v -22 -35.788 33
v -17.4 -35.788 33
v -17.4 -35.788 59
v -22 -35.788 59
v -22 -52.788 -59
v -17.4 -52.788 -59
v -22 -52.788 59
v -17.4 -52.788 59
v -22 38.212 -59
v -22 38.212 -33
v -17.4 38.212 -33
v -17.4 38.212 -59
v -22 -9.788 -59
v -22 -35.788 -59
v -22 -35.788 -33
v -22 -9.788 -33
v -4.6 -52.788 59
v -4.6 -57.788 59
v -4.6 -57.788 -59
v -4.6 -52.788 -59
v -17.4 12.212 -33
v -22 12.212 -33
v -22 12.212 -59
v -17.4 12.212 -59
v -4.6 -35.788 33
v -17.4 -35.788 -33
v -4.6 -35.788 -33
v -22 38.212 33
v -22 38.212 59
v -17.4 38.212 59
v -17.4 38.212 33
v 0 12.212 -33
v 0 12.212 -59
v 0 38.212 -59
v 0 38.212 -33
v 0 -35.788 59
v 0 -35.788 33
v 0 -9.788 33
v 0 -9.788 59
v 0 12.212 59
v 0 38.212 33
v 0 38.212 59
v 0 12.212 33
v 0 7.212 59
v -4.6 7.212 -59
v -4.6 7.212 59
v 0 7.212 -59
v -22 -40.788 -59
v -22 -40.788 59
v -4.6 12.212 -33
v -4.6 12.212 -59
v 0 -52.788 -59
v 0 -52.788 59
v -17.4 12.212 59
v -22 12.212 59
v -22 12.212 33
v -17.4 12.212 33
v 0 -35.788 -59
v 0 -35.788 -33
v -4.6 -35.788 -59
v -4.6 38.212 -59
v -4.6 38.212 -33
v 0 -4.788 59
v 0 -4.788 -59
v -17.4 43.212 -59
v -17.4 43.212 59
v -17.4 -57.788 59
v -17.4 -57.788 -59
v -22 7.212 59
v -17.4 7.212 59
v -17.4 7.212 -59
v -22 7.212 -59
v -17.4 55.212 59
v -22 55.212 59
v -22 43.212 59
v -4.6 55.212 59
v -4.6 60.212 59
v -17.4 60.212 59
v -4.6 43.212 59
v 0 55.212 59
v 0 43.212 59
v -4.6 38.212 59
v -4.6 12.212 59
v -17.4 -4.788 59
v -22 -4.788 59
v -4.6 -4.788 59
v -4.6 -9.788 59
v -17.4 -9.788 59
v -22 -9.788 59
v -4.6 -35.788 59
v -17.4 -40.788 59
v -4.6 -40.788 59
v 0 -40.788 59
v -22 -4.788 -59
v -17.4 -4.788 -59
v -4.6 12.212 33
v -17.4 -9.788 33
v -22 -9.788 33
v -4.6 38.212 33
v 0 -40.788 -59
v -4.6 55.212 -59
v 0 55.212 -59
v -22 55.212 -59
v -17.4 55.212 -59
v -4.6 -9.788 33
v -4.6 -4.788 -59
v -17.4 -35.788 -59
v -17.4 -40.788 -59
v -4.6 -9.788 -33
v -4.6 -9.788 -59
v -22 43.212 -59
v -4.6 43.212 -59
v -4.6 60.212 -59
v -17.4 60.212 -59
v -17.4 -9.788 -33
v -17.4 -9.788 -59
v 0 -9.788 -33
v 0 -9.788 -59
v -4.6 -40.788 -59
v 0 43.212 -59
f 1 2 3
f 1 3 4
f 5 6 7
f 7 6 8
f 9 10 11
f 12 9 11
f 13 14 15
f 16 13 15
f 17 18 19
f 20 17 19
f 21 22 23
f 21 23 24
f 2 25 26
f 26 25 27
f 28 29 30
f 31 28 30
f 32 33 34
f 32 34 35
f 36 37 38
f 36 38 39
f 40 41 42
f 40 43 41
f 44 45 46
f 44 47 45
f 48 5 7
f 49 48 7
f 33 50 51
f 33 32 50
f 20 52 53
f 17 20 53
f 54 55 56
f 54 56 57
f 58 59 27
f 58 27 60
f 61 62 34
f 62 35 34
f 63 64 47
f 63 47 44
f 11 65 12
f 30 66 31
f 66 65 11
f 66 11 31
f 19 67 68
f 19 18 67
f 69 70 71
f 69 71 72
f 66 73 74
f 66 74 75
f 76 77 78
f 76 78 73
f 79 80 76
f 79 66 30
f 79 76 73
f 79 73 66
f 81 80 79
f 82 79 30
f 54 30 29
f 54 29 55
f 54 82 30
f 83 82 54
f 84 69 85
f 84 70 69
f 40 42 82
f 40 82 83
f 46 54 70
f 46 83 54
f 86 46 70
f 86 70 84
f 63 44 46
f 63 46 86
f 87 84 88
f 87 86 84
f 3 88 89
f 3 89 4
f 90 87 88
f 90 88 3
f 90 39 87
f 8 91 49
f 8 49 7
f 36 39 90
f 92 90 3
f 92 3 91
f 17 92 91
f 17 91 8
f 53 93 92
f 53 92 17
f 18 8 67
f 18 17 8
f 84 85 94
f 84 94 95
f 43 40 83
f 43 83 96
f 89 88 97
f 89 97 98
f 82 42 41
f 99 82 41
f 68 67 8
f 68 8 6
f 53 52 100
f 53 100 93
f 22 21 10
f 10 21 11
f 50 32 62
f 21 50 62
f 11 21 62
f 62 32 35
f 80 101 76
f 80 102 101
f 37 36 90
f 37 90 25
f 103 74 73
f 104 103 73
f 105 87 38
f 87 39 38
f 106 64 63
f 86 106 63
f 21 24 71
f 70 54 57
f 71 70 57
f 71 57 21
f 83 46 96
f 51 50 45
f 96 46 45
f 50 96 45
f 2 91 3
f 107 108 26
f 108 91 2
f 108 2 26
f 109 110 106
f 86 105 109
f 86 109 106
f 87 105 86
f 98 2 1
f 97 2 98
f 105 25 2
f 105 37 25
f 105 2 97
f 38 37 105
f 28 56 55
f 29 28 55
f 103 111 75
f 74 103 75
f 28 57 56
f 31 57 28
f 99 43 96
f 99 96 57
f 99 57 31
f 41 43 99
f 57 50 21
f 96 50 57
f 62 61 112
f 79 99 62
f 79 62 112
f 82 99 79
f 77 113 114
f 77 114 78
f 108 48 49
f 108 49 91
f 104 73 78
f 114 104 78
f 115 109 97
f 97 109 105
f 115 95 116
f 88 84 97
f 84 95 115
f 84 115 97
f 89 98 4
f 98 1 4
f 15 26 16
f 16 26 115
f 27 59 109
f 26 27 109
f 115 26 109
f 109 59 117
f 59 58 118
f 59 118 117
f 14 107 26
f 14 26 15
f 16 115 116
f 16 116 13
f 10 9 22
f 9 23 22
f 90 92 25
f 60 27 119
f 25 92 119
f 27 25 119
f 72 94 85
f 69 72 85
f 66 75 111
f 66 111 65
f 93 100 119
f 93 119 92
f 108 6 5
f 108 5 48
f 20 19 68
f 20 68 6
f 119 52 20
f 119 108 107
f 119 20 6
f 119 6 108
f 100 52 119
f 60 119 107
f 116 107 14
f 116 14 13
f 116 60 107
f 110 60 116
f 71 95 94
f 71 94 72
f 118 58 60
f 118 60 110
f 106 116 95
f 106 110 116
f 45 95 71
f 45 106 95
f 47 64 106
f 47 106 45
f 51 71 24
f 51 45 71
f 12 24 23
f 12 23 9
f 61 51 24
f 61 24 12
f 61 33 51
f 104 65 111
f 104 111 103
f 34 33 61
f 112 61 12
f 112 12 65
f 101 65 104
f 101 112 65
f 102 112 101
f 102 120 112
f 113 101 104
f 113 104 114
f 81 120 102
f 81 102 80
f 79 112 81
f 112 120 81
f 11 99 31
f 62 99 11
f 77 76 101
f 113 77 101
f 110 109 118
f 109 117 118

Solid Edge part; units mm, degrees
sketch "Sketch1" plane through (0, 0, 0) normal (1, 0, 0) x (0, 1, 0)
  line L0 (-57.7882, -59) -> (60.2118, -59)
  line L1 (60.2118, -59) -> (60.2118, 59)
  line L2 (60.2118, 59) -> (-57.7882, 59)
  line L3 (-57.7882, 59) -> (-57.7882, -59)
extrude "Protrusion1" add sketch "Sketch1" against normal blind 22
sketch "Sketch2" plane through (0, 1.2118, 0) normal (1, 0, 0) x (0, 1, 0)
  line L0 (-37, 33) -> (-37, -33)
  line L1 (-37, -33) -> (-11, -33)
  line L2 (-11, -33) -> (-11, 33)
  line L3 (-37, 33) -> (-11, 33)
extrude "ExtrudedCutout_1" cut sketch "Sketch2" against normal blind 50
sketch "Sketch3" plane through (0, 1.2118, 0) normal (1, 0, 0) x (0, 1, 0)
  line L0 (37, 33) -> (37, -33)
  line L1 (11, -33) -> (37, -33)
  line L2 (11, -33) -> (11, 33)
  line L3 (11, 33) -> (37, 33)
extrude "ExtrudedCutout_2" cut sketch "Sketch3" against normal blind 28
sketch "Sketch4" plane through (-11, -57.7882, 0) normal (0, -1, 0) x (0, 0, -1)
  line L0 (-59, 11) -> (59, 11)
  line L1 (-59, 11) -> (-59, 6.4)
  line L2 (-59, 6.4) -> (59, 6.4)
  line L3 (59, 6.4) -> (59, 11)
extrude "ExtrudedCutout_3" cut sketch "Sketch4" against normal blind 5
sketch "Sketch5" plane through (-13.3, -57.7882, 0) normal (0, -1, 0) x (0, 0, -1)
  line L0 (-59, -4.1) -> (59, -4.1)
  line L1 (59, -4.1) -> (59, -8.7)
  line L2 (59, -8.7) -> (-59, -8.7)
  line L3 (-59, -8.7) -> (-59, -4.1)
extrude "ExtrudedCutout_4" cut sketch "Sketch5" against normal blind 5
sketch "Sketch6" plane through (0, 3.7118, 0) normal (1, 0, 0) x (0, 1, 0)
  line L0 (-39.5, -37) -> (-39.5, -59)
  line L1 (-39.5, -59) -> (-44.5, -59)
  line L2 (-44.5, -59) -> (-44.5, 59)
  line L3 (-44.5, 59) -> (-39.5, 59)
  line L4 (-39.5, 59) -> (-39.5, -37)
extrude "ExtrudedCutout_5" cut sketch "Sketch6" against normal blind 4.6
sketch "Sketch7" plane through (-11, 1.2118, -59) normal (0, 0, -1) x (0, 1, 0)
  line L0 (-42, -11) -> (-42, -6.4)
  line L1 (-42, -6.4) -> (-37, -6.4)
  line L2 (-37, -6.4) -> (-37, -11)
  line L3 (-37, -11) -> (-42, -11)
extrude "ExtrudedCutout_6" cut sketch "Sketch7" against normal blind 120
sketch "Sketch8" plane through (0, 12.2118, 0) normal (1, 0, 0) x (0, 1, 0)
  line L0 (-22, -33) -> (-22, -59)
  line L1 (-22, -59) -> (-17, -59)
  line L2 (-17, -59) -> (-17, 59)
  line L3 (-17, 59) -> (-22, 59)
  line L4 (-22, 59) -> (-22, -33)
extrude "ExtrudedCutout_7" cut sketch "Sketch8" against normal blind 4.6
sketch "Sketch9" plane through (0, 27.7118, 0) normal (1, 0, 0) x (0, 1, 0)
  line L0 (-15.5, -33) -> (-15.5, -59)
  line L1 (-15.5, -59) -> (-20.5, -59)
  line L2 (-20.5, -59) -> (-20.5, 59)
  line L3 (-20.5, 59) -> (-15.5, 59)
  line L4 (-15.5, 59) -> (-15.5, -33)
extrude "ExtrudedCutout_8" cut sketch "Sketch9" against normal blind 4.6
sketch "Sketch10" plane through (-11, 1.2118, 59) normal (0, 0, 1) x (0, 1, 0)
  line L0 (-6, 11) -> (-6, 6.4)
  line L1 (-6, 6.4) -> (-11, 6.4)
  line L2 (-11, 6.4) -> (-11, 11)
  line L3 (-11, 11) -> (-6, 11)
  line L4 (11, 6.4) -> (6, 6.4)
  line L5 (6, 6.4) -> (6, 11)
  line L6 (6, 11) -> (11, 11)
  line L7 (11, 11) -> (11, 6.4)
extrude "Cutout1" cut sketch "Sketch10" against normal blind 118
sketch "Sketch11" plane through (0, 36.2118, 0) normal (1, 0, 0) x (0, 1, 0)
  line L0 (2, -59) -> (7, -59)
  line L1 (7, -59) -> (7, 59)
  line L2 (7, 59) -> (2, 59)
  line L3 (2, 59) -> (2, -59)
extrude "ExtrudedCutout_10" cut sketch "Sketch11" against normal blind 4.6
sketch "Sketch12" plane through (0, 51.7118, 0) normal (1, 0, 0) x (0, 0, -1)
  line L0 (59, 8.5) -> (59, 3.5)
  line L1 (59, 3.5) -> (-59, 3.5)
  line L2 (-59, 3.5) -> (-59, 8.5)
  line L3 (-59, 8.5) -> (59, 8.5)
extrude "ExtrudedCutout_11" cut sketch "Sketch12" against normal blind 4.6
sketch "Sketch13" plane through (-11, 1.2118, 59) normal (0, 0, 1) x (0, 1, 0)
  line L0 (42, 11) -> (42, 6.4)
  line L1 (42, 6.4) -> (37, 6.4)
  line L2 (37, 11) -> (37, 6.4)
  line L3 (42, 11) -> (37, 11)
  line L4 (54, 6.4) -> (59, 6.4)
  line L5 (59, 6.4) -> (59, 11)
  line L6 (59, 11) -> (54, 11)
  line L7 (54, 11) -> (54, 6.4)
extrude "ExtrudedCutout_12" cut sketch "Sketch13" against normal blind 118
properties material "Stainless steel"
